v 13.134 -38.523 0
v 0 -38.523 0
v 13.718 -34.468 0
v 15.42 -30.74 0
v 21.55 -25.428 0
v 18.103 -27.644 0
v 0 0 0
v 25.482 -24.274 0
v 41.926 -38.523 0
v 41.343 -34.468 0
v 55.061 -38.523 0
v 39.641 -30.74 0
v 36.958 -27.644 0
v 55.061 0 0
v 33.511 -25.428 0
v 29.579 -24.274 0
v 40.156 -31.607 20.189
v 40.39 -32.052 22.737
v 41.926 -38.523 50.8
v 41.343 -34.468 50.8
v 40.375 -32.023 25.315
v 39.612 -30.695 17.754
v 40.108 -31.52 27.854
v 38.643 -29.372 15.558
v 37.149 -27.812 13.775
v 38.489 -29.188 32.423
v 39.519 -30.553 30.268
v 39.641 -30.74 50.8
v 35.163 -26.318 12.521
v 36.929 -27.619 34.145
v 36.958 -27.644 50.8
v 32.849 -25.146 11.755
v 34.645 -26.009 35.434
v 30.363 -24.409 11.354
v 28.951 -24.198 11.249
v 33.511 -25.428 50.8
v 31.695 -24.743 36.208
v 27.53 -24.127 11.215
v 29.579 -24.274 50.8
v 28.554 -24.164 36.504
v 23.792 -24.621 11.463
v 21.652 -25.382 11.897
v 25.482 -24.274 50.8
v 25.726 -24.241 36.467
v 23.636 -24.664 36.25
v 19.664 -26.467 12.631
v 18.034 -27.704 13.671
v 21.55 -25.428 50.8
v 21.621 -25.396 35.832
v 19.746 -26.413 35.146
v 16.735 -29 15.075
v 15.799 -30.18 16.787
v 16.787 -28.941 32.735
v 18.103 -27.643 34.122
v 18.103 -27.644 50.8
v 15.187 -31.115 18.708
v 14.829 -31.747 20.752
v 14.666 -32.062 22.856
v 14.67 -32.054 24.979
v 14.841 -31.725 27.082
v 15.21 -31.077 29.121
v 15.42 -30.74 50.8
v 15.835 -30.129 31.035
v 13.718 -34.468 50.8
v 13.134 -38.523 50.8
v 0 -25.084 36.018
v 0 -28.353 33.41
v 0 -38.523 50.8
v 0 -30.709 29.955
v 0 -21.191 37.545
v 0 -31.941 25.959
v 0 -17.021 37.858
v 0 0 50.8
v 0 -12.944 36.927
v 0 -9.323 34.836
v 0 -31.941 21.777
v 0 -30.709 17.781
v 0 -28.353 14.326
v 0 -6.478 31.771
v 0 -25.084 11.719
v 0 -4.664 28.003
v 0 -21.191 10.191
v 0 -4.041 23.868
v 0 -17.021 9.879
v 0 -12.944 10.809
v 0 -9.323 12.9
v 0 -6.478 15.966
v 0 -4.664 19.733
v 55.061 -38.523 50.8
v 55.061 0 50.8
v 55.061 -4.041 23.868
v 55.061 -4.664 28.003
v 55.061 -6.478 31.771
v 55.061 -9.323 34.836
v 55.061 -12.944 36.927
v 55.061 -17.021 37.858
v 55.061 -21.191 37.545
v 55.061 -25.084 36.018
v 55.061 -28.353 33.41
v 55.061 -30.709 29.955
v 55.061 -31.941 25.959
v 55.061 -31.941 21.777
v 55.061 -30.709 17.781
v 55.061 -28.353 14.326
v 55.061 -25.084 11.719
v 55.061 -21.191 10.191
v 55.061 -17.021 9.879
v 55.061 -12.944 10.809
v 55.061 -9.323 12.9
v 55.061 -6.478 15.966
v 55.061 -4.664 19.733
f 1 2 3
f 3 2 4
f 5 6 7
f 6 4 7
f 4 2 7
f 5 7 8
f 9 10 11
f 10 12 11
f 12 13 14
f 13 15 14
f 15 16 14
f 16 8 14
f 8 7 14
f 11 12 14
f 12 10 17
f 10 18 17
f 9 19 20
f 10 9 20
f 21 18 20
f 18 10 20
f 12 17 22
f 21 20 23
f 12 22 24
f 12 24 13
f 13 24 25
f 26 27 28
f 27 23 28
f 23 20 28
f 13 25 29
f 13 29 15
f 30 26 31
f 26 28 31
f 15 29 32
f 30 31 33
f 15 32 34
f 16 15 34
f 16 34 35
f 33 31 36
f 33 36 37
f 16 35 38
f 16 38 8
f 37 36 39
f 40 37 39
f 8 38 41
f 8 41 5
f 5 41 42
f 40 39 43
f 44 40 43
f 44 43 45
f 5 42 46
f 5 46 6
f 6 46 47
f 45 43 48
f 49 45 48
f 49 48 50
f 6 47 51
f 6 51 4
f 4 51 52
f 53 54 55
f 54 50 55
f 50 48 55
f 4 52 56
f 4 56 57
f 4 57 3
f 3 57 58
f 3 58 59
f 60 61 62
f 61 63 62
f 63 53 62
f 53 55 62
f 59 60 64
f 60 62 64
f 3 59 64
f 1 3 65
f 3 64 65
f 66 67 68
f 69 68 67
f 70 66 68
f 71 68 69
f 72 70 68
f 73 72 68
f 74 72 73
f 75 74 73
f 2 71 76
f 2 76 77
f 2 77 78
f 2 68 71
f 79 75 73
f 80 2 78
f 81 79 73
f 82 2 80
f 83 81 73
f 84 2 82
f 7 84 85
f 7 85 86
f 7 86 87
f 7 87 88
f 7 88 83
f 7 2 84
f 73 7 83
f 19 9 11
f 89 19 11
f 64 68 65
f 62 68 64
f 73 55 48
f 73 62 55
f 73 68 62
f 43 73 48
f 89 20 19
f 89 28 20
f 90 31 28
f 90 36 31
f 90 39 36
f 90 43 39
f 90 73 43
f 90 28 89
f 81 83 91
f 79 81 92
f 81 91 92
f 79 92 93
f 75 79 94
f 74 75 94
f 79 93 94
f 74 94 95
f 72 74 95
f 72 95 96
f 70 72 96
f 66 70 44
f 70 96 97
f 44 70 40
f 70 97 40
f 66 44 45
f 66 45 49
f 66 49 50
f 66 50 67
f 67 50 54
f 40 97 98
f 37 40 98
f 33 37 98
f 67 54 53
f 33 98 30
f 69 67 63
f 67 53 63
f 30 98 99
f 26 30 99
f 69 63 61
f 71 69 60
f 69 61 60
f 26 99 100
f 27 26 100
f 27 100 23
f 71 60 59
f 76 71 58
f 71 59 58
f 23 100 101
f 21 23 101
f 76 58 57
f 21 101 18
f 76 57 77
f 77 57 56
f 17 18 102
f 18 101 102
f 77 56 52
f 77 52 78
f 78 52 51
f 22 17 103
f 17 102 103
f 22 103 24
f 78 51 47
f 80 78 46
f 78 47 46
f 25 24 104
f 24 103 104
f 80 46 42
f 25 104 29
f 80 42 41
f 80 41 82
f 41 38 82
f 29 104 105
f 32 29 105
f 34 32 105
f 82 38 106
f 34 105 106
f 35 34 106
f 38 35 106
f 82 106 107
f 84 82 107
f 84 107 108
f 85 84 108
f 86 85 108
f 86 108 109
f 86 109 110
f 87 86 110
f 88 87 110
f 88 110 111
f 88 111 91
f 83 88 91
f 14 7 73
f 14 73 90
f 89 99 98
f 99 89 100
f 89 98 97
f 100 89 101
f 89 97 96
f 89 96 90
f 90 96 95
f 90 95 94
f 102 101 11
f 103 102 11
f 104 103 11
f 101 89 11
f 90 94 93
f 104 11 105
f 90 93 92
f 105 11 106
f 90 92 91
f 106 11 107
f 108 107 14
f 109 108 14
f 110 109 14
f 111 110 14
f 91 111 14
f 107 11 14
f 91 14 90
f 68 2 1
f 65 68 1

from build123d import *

# Parameters (mm, degrees)
F0_W     = 55.060647
F0_H     = 38.523335
F1_DEPTH = 50.8
F3_DEPTH = 76.2
F4_R     = 14.028746
F5_DEPTH = 76.2


with BuildPart() as f1:
    # F0 (on Top) → F1 (new body)
    with BuildSketch(Plane.XY):
        with Locations((27.530323, -19.261667)):
            Rectangle(F0_W, F0_H)
    extrude(amount=F1_DEPTH)

    # F2 (on face) → F3 (cut)
    with BuildSketch(Plane.XY.offset(50.8)):
        with BuildLine():
            Line((13.1344, -38.523335), (41.926248, -38.523335))
            ThreePointArc((41.926248, -38.523335), (27.530324, -24.127411), (13.1344, -38.523335))
        make_face()
        with BuildLine():
            ThreePointArc((13.1344, -38.523335), (27.530324, -52.919259), (41.926248, -38.523335))
            Line((41.926248, -38.523335), (13.1344, -38.523335))
        make_face()
    extrude(amount=-F3_DEPTH, mode=Mode.SUBTRACT)

    # F4 (on face) → F5 (cut)
    with BuildSketch(Plane.YZ.offset(55.060647)):
        with Locations((-18.069319, 23.868291)):
            Circle(F4_R)
    extrude(amount=-F5_DEPTH, mode=Mode.SUBTRACT)


solid = f1.part
